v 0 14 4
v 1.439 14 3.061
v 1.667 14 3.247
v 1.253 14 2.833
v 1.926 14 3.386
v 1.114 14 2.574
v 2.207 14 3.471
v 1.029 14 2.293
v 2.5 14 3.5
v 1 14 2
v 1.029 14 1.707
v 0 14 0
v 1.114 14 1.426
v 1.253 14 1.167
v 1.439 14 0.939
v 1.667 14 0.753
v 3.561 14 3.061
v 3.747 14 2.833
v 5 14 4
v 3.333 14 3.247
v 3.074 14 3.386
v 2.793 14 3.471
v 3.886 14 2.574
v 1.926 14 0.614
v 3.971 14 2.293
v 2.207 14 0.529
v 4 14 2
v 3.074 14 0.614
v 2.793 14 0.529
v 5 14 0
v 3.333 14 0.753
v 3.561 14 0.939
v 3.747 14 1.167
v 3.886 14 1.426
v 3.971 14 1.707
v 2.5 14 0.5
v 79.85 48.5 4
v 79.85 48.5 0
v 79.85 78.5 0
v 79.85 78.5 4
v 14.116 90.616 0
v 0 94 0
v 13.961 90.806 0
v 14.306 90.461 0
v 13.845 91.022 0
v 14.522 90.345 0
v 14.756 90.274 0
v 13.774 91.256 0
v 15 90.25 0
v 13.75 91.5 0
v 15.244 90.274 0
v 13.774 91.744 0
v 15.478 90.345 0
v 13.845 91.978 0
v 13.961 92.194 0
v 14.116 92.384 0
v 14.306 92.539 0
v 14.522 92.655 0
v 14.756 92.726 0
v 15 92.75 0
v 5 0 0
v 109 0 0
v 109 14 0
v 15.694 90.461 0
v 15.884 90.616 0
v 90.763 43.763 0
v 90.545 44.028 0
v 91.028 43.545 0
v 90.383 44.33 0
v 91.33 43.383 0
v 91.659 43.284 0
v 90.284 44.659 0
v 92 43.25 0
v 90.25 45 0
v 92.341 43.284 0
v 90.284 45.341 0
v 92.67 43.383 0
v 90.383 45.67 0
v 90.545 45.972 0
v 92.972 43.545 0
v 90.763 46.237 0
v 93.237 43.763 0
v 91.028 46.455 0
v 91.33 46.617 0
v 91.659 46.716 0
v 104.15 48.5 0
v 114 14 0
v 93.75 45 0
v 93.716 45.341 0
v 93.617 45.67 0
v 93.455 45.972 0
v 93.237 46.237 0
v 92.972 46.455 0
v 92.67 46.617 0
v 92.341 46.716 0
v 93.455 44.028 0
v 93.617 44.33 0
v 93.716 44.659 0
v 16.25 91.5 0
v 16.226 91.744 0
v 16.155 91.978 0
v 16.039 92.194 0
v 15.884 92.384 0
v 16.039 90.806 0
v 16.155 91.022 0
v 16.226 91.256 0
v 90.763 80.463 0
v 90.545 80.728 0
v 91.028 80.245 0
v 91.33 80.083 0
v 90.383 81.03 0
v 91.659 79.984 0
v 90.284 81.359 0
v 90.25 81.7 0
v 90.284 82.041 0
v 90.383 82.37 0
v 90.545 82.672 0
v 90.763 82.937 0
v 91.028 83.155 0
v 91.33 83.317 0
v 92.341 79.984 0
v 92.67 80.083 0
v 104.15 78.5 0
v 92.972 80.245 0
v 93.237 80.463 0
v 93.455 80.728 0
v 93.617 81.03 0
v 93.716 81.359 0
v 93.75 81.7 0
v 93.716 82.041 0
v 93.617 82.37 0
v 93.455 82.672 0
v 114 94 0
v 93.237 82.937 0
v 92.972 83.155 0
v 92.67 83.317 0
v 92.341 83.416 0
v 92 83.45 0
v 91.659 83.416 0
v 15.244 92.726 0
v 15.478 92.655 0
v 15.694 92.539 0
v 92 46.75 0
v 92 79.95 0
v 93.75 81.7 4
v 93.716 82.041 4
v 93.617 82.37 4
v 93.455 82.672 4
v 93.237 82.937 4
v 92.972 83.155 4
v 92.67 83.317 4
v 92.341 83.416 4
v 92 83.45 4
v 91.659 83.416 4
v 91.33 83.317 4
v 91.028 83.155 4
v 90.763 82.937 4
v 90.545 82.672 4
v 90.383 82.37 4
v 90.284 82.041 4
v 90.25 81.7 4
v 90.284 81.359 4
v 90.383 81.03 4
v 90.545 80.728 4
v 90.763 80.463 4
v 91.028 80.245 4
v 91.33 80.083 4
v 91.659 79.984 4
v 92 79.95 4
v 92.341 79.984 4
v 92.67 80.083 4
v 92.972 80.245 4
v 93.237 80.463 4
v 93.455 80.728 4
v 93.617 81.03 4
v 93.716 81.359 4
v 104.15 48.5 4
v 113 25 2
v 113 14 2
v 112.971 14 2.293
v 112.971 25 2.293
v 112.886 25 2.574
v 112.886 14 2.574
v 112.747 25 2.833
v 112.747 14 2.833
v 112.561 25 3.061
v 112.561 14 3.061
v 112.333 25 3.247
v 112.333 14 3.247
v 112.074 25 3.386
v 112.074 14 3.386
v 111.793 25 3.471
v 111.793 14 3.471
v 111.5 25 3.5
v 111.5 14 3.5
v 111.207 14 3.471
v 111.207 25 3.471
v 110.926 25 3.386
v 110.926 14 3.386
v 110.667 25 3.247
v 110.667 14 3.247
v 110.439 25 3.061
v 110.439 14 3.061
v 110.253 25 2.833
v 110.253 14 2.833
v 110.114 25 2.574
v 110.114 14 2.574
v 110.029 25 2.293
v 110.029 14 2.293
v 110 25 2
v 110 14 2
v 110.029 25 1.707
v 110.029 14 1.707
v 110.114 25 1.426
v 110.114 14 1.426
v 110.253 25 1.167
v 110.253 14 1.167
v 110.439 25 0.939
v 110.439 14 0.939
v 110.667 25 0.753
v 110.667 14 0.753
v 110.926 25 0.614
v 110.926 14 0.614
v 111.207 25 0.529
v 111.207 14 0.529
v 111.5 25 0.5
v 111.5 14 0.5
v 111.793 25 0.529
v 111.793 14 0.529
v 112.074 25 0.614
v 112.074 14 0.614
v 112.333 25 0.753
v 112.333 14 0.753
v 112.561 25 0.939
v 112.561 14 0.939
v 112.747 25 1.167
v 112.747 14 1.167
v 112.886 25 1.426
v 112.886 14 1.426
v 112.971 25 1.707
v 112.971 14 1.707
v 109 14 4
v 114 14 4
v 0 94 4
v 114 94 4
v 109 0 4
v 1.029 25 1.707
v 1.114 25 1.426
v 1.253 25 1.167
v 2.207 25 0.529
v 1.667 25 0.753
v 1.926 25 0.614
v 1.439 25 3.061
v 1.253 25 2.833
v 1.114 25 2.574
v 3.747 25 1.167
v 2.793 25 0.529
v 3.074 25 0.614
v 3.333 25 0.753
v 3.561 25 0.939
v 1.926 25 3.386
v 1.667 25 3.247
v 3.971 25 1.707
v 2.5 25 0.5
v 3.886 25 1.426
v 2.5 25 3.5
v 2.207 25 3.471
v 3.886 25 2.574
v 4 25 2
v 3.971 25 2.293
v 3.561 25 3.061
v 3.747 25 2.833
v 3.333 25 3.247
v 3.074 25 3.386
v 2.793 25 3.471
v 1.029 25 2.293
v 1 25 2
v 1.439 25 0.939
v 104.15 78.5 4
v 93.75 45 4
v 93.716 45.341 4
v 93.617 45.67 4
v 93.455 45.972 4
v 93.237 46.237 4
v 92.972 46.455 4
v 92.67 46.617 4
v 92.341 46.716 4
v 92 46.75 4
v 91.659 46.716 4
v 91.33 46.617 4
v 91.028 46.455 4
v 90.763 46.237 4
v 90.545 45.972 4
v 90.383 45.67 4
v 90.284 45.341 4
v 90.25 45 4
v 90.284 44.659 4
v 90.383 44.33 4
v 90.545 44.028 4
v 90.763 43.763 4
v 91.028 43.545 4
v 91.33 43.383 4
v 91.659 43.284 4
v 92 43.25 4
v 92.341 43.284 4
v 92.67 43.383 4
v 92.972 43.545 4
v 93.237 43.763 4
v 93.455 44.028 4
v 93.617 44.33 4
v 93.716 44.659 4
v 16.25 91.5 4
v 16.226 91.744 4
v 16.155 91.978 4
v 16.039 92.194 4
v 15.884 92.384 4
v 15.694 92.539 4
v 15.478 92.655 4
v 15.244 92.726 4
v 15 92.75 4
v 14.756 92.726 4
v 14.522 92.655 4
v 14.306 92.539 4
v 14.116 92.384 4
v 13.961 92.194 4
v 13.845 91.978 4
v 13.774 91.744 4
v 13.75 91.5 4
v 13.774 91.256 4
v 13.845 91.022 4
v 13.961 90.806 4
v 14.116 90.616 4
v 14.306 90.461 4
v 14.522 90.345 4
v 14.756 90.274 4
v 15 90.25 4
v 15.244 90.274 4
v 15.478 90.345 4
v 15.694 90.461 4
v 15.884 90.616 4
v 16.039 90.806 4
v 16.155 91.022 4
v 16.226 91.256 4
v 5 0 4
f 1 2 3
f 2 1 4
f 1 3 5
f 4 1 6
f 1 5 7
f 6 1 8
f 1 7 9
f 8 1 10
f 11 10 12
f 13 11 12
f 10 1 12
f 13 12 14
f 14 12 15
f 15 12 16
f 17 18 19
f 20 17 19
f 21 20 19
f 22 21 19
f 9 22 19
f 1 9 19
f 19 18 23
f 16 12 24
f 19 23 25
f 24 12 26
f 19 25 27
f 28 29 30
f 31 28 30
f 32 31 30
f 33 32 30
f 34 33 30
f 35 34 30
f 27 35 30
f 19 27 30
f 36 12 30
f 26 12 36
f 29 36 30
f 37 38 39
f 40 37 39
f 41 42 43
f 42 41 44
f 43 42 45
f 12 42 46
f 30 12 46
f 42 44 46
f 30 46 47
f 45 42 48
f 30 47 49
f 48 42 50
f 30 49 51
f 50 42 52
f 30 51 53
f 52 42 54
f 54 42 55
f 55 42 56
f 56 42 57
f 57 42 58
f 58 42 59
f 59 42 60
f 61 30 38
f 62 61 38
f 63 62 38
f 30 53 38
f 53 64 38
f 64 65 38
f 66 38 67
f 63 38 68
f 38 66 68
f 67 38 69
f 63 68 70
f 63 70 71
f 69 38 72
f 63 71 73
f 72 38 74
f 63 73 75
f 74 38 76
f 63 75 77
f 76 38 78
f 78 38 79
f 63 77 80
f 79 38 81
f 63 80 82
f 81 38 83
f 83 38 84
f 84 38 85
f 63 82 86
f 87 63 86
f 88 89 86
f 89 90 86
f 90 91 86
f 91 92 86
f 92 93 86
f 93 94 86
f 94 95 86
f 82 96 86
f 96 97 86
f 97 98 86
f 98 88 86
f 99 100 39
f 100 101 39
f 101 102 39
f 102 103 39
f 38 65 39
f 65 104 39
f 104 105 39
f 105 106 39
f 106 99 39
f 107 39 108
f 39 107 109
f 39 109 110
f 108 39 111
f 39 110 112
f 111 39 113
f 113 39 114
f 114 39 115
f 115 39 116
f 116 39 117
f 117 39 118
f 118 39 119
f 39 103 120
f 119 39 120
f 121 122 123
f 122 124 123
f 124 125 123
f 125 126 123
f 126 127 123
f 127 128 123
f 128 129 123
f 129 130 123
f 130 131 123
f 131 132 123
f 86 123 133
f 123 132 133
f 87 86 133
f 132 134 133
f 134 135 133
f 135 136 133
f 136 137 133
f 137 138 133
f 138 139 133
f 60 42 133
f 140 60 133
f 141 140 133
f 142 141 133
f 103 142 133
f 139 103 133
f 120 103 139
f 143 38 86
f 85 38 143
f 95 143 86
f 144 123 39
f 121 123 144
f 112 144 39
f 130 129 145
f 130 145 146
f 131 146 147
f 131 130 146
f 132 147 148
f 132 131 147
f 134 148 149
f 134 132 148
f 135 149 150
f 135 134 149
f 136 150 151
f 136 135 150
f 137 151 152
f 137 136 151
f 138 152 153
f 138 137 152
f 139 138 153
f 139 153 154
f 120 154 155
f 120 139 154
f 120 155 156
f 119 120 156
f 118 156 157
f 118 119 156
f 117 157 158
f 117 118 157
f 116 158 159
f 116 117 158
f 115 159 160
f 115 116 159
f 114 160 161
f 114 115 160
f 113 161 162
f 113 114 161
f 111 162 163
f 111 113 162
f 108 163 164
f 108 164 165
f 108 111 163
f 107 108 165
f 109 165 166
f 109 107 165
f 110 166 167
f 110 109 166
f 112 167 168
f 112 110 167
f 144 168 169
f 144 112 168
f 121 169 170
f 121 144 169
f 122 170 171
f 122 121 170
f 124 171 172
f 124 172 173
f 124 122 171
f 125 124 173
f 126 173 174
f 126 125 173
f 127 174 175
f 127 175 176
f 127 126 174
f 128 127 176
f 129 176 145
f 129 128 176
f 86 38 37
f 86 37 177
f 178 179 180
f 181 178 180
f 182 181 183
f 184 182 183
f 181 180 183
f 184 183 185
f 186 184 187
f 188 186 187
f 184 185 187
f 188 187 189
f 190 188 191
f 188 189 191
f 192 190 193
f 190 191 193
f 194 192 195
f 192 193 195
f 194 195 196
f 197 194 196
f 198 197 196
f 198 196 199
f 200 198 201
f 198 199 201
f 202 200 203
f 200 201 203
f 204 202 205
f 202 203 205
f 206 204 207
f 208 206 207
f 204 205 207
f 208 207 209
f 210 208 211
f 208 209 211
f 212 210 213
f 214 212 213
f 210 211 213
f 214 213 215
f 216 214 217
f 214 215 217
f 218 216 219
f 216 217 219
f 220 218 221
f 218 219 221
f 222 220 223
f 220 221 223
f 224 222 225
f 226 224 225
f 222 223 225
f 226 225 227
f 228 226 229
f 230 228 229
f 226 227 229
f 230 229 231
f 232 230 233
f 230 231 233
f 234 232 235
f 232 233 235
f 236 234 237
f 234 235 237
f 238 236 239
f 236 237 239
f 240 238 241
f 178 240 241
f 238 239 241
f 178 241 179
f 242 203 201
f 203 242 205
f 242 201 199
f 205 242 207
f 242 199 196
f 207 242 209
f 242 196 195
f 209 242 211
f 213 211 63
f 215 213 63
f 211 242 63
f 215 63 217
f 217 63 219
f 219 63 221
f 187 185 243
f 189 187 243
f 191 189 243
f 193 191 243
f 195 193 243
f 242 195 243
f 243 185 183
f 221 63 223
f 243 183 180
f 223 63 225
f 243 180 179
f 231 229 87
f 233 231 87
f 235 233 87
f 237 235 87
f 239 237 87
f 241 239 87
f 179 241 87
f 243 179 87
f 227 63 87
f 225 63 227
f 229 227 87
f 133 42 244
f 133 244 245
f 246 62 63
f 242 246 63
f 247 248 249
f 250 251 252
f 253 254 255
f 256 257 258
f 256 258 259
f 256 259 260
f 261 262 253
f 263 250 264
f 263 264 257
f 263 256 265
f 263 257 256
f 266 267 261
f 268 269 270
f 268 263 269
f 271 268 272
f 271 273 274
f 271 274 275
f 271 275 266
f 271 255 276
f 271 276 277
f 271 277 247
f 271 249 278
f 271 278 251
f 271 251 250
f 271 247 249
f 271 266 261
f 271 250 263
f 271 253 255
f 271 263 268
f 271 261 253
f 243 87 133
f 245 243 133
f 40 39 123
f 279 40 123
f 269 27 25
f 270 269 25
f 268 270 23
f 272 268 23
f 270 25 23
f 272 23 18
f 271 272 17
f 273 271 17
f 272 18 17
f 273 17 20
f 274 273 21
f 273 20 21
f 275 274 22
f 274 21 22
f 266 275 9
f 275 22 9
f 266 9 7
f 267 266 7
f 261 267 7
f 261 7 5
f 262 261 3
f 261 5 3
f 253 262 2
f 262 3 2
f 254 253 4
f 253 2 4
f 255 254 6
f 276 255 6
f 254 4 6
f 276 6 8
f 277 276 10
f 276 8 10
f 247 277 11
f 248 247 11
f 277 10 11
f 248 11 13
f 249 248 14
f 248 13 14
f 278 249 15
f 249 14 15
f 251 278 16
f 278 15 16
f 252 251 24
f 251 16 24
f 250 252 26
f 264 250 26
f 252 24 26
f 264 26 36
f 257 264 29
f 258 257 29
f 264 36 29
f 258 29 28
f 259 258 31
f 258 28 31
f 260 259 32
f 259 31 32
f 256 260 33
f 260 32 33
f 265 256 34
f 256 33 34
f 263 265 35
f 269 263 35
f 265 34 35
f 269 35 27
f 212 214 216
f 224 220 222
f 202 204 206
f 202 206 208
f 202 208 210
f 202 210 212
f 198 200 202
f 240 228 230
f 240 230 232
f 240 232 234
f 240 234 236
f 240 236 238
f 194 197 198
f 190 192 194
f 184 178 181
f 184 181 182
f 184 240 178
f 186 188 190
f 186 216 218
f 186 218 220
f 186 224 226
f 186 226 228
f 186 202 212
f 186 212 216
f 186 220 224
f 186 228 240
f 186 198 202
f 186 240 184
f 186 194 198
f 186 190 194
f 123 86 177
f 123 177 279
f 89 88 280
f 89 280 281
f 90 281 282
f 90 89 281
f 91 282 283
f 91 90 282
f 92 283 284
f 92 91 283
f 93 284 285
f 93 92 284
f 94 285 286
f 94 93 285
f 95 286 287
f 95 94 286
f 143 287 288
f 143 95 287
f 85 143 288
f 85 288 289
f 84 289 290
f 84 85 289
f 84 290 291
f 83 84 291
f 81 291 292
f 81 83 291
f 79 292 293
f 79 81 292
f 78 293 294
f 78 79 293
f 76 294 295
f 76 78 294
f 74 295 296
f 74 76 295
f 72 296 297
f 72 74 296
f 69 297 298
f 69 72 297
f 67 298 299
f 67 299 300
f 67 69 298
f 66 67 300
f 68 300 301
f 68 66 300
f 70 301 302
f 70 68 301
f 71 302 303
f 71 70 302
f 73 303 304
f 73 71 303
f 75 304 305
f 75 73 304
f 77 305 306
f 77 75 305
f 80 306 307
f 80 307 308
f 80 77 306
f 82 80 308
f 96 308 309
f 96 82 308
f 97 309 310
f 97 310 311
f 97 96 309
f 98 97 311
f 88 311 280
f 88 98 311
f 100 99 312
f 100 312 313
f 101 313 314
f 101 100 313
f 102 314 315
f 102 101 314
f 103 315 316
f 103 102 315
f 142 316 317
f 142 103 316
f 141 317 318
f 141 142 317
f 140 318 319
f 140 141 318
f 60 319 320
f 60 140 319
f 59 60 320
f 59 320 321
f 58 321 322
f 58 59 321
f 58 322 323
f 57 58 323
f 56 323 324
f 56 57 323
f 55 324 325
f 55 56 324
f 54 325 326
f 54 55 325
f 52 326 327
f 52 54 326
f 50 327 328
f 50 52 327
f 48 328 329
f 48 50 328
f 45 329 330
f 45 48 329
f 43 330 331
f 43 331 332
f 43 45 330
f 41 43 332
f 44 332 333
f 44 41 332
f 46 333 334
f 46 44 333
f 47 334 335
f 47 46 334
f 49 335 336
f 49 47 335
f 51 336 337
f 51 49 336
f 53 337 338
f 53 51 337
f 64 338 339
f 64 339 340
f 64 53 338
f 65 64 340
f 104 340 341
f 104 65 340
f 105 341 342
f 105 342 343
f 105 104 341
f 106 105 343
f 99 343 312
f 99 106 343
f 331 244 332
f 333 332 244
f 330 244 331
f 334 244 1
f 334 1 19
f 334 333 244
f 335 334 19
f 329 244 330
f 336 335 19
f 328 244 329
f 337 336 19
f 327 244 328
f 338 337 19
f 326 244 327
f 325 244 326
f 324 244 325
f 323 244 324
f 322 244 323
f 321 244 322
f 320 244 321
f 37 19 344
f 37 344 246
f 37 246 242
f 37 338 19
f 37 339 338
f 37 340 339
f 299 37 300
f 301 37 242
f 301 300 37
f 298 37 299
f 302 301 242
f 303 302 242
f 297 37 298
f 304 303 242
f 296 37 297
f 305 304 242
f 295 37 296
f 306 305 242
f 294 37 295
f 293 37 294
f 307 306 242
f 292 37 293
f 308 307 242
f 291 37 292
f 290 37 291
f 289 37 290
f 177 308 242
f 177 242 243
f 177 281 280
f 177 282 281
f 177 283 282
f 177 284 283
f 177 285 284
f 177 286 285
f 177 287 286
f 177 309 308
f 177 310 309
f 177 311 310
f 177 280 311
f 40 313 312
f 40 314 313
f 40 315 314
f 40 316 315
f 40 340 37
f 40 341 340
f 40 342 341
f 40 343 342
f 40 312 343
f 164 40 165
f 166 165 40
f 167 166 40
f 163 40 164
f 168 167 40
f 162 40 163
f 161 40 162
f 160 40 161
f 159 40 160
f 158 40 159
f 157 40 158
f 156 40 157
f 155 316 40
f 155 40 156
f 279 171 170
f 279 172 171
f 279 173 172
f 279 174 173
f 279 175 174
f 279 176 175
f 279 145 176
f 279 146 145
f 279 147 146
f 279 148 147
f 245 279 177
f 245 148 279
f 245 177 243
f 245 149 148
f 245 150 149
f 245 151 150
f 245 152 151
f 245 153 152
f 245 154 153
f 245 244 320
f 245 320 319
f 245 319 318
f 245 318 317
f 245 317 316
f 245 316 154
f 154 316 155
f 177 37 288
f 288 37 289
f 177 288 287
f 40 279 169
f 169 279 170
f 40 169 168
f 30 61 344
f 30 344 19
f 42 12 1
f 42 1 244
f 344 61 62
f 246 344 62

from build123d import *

# Parameters (mm, degrees)
SKETCH207_W     = 104
SKETCH207_H     = 14
SKETCH207_W_2   = 114
SKETCH207_H_2   = 80
SKETCH207_R     = 1.75
SKETCH207_R_2   = 1.25
SKETCH207_W_3   = 24.3
SKETCH207_H_3   = 30
PAD103_DEPTH    = 4
SKETCH208_R     = 1.5
POCKET120_DEPTH = 11


with BuildPart() as part:
    # Sketch207 → Pad103 (new body)
    with BuildSketch(Plane.XY):
        with Locations((57, 7)):
            Rectangle(SKETCH207_W, SKETCH207_H)
        with Locations((57, 54)):
            Rectangle(SKETCH207_W_2, SKETCH207_H_2)
        with Locations((92, 45)):
            Circle(SKETCH207_R, mode=Mode.SUBTRACT)
        with Locations((92, 81.7)):
            Circle(SKETCH207_R, mode=Mode.SUBTRACT)
        with Locations((15, 91.5)):
            Circle(SKETCH207_R_2, mode=Mode.SUBTRACT)
        with Locations((92, 63.5)):
            Rectangle(SKETCH207_W_3, SKETCH207_H_3, mode=Mode.SUBTRACT)
    extrude(amount=PAD103_DEPTH)

    # Sketch208 (on Face2 of Pad103) → Pocket120 (cut)
    with BuildSketch(Plane.XZ.offset(-14)):
        with Locations((2.5, 2)):
            Circle(SKETCH208_R)
        with Locations((111.5, 2)):
            Circle(SKETCH208_R)
    extrude(amount=-POCKET120_DEPTH, mode=Mode.SUBTRACT)


solid = part.part
